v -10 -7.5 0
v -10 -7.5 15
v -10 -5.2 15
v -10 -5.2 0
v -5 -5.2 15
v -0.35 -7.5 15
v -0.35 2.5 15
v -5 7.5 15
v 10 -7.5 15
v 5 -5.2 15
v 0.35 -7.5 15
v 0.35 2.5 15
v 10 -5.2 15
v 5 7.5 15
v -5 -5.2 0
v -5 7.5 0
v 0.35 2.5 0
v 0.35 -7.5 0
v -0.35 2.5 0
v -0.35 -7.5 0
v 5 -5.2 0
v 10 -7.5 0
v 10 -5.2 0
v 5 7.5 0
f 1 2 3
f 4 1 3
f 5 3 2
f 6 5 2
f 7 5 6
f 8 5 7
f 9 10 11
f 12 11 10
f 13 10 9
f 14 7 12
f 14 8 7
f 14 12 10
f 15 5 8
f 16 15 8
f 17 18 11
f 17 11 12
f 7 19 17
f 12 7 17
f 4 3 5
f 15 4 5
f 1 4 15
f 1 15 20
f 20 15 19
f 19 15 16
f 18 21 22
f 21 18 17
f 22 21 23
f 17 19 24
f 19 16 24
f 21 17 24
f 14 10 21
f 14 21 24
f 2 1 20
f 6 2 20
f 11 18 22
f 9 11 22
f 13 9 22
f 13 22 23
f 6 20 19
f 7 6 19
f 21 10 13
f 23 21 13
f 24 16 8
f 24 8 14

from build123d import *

# Parameters (mm, degrees)
SKETCH1_W               = 10
SKETCH1_H               = 15
BOSS_EXTRUDE1_DEPTH     = 15
CUT_EXTRUDE1_DEPTH      = 18.5
CUT_EXTRUDE1_DEPTH_BACK = 18.5
SKETCH2_W               = 0.7
SKETCH2_H               = 10
SKETCH3_W               = 5
SKETCH3_H               = 2.3
BOSS_EXTRUDE2_DEPTH     = 15


with BuildPart() as part:
    # Sketch1 → Boss-Extrude1 (new body)
    with BuildSketch(Plane.XY):
        Rectangle(SKETCH1_W, SKETCH1_H)
    extrude(amount=BOSS_EXTRUDE1_DEPTH)

    # Sketch2 → Cut-Extrude1 (cut, two sides: drawn at the far end of the back side and taken through both)
    with BuildSketch(Plane.XY.offset(15).offset(-CUT_EXTRUDE1_DEPTH_BACK)):
        with Locations((0, -2.5)):
            Rectangle(SKETCH2_W, SKETCH2_H)
    extrude(amount=CUT_EXTRUDE1_DEPTH + CUT_EXTRUDE1_DEPTH_BACK, mode=Mode.SUBTRACT)

    # Sketch3 → Boss-Extrude2 (add)
    with BuildSketch(Plane.XY.offset(15)):
        with Locations((-7.5, -6.35)):
            Rectangle(SKETCH3_W, SKETCH3_H)
        with Locations((7.5, -6.35)):
            Rectangle(SKETCH3_W, SKETCH3_H)
    extrude(amount=-BOSS_EXTRUDE2_DEPTH)


solid = part.part
